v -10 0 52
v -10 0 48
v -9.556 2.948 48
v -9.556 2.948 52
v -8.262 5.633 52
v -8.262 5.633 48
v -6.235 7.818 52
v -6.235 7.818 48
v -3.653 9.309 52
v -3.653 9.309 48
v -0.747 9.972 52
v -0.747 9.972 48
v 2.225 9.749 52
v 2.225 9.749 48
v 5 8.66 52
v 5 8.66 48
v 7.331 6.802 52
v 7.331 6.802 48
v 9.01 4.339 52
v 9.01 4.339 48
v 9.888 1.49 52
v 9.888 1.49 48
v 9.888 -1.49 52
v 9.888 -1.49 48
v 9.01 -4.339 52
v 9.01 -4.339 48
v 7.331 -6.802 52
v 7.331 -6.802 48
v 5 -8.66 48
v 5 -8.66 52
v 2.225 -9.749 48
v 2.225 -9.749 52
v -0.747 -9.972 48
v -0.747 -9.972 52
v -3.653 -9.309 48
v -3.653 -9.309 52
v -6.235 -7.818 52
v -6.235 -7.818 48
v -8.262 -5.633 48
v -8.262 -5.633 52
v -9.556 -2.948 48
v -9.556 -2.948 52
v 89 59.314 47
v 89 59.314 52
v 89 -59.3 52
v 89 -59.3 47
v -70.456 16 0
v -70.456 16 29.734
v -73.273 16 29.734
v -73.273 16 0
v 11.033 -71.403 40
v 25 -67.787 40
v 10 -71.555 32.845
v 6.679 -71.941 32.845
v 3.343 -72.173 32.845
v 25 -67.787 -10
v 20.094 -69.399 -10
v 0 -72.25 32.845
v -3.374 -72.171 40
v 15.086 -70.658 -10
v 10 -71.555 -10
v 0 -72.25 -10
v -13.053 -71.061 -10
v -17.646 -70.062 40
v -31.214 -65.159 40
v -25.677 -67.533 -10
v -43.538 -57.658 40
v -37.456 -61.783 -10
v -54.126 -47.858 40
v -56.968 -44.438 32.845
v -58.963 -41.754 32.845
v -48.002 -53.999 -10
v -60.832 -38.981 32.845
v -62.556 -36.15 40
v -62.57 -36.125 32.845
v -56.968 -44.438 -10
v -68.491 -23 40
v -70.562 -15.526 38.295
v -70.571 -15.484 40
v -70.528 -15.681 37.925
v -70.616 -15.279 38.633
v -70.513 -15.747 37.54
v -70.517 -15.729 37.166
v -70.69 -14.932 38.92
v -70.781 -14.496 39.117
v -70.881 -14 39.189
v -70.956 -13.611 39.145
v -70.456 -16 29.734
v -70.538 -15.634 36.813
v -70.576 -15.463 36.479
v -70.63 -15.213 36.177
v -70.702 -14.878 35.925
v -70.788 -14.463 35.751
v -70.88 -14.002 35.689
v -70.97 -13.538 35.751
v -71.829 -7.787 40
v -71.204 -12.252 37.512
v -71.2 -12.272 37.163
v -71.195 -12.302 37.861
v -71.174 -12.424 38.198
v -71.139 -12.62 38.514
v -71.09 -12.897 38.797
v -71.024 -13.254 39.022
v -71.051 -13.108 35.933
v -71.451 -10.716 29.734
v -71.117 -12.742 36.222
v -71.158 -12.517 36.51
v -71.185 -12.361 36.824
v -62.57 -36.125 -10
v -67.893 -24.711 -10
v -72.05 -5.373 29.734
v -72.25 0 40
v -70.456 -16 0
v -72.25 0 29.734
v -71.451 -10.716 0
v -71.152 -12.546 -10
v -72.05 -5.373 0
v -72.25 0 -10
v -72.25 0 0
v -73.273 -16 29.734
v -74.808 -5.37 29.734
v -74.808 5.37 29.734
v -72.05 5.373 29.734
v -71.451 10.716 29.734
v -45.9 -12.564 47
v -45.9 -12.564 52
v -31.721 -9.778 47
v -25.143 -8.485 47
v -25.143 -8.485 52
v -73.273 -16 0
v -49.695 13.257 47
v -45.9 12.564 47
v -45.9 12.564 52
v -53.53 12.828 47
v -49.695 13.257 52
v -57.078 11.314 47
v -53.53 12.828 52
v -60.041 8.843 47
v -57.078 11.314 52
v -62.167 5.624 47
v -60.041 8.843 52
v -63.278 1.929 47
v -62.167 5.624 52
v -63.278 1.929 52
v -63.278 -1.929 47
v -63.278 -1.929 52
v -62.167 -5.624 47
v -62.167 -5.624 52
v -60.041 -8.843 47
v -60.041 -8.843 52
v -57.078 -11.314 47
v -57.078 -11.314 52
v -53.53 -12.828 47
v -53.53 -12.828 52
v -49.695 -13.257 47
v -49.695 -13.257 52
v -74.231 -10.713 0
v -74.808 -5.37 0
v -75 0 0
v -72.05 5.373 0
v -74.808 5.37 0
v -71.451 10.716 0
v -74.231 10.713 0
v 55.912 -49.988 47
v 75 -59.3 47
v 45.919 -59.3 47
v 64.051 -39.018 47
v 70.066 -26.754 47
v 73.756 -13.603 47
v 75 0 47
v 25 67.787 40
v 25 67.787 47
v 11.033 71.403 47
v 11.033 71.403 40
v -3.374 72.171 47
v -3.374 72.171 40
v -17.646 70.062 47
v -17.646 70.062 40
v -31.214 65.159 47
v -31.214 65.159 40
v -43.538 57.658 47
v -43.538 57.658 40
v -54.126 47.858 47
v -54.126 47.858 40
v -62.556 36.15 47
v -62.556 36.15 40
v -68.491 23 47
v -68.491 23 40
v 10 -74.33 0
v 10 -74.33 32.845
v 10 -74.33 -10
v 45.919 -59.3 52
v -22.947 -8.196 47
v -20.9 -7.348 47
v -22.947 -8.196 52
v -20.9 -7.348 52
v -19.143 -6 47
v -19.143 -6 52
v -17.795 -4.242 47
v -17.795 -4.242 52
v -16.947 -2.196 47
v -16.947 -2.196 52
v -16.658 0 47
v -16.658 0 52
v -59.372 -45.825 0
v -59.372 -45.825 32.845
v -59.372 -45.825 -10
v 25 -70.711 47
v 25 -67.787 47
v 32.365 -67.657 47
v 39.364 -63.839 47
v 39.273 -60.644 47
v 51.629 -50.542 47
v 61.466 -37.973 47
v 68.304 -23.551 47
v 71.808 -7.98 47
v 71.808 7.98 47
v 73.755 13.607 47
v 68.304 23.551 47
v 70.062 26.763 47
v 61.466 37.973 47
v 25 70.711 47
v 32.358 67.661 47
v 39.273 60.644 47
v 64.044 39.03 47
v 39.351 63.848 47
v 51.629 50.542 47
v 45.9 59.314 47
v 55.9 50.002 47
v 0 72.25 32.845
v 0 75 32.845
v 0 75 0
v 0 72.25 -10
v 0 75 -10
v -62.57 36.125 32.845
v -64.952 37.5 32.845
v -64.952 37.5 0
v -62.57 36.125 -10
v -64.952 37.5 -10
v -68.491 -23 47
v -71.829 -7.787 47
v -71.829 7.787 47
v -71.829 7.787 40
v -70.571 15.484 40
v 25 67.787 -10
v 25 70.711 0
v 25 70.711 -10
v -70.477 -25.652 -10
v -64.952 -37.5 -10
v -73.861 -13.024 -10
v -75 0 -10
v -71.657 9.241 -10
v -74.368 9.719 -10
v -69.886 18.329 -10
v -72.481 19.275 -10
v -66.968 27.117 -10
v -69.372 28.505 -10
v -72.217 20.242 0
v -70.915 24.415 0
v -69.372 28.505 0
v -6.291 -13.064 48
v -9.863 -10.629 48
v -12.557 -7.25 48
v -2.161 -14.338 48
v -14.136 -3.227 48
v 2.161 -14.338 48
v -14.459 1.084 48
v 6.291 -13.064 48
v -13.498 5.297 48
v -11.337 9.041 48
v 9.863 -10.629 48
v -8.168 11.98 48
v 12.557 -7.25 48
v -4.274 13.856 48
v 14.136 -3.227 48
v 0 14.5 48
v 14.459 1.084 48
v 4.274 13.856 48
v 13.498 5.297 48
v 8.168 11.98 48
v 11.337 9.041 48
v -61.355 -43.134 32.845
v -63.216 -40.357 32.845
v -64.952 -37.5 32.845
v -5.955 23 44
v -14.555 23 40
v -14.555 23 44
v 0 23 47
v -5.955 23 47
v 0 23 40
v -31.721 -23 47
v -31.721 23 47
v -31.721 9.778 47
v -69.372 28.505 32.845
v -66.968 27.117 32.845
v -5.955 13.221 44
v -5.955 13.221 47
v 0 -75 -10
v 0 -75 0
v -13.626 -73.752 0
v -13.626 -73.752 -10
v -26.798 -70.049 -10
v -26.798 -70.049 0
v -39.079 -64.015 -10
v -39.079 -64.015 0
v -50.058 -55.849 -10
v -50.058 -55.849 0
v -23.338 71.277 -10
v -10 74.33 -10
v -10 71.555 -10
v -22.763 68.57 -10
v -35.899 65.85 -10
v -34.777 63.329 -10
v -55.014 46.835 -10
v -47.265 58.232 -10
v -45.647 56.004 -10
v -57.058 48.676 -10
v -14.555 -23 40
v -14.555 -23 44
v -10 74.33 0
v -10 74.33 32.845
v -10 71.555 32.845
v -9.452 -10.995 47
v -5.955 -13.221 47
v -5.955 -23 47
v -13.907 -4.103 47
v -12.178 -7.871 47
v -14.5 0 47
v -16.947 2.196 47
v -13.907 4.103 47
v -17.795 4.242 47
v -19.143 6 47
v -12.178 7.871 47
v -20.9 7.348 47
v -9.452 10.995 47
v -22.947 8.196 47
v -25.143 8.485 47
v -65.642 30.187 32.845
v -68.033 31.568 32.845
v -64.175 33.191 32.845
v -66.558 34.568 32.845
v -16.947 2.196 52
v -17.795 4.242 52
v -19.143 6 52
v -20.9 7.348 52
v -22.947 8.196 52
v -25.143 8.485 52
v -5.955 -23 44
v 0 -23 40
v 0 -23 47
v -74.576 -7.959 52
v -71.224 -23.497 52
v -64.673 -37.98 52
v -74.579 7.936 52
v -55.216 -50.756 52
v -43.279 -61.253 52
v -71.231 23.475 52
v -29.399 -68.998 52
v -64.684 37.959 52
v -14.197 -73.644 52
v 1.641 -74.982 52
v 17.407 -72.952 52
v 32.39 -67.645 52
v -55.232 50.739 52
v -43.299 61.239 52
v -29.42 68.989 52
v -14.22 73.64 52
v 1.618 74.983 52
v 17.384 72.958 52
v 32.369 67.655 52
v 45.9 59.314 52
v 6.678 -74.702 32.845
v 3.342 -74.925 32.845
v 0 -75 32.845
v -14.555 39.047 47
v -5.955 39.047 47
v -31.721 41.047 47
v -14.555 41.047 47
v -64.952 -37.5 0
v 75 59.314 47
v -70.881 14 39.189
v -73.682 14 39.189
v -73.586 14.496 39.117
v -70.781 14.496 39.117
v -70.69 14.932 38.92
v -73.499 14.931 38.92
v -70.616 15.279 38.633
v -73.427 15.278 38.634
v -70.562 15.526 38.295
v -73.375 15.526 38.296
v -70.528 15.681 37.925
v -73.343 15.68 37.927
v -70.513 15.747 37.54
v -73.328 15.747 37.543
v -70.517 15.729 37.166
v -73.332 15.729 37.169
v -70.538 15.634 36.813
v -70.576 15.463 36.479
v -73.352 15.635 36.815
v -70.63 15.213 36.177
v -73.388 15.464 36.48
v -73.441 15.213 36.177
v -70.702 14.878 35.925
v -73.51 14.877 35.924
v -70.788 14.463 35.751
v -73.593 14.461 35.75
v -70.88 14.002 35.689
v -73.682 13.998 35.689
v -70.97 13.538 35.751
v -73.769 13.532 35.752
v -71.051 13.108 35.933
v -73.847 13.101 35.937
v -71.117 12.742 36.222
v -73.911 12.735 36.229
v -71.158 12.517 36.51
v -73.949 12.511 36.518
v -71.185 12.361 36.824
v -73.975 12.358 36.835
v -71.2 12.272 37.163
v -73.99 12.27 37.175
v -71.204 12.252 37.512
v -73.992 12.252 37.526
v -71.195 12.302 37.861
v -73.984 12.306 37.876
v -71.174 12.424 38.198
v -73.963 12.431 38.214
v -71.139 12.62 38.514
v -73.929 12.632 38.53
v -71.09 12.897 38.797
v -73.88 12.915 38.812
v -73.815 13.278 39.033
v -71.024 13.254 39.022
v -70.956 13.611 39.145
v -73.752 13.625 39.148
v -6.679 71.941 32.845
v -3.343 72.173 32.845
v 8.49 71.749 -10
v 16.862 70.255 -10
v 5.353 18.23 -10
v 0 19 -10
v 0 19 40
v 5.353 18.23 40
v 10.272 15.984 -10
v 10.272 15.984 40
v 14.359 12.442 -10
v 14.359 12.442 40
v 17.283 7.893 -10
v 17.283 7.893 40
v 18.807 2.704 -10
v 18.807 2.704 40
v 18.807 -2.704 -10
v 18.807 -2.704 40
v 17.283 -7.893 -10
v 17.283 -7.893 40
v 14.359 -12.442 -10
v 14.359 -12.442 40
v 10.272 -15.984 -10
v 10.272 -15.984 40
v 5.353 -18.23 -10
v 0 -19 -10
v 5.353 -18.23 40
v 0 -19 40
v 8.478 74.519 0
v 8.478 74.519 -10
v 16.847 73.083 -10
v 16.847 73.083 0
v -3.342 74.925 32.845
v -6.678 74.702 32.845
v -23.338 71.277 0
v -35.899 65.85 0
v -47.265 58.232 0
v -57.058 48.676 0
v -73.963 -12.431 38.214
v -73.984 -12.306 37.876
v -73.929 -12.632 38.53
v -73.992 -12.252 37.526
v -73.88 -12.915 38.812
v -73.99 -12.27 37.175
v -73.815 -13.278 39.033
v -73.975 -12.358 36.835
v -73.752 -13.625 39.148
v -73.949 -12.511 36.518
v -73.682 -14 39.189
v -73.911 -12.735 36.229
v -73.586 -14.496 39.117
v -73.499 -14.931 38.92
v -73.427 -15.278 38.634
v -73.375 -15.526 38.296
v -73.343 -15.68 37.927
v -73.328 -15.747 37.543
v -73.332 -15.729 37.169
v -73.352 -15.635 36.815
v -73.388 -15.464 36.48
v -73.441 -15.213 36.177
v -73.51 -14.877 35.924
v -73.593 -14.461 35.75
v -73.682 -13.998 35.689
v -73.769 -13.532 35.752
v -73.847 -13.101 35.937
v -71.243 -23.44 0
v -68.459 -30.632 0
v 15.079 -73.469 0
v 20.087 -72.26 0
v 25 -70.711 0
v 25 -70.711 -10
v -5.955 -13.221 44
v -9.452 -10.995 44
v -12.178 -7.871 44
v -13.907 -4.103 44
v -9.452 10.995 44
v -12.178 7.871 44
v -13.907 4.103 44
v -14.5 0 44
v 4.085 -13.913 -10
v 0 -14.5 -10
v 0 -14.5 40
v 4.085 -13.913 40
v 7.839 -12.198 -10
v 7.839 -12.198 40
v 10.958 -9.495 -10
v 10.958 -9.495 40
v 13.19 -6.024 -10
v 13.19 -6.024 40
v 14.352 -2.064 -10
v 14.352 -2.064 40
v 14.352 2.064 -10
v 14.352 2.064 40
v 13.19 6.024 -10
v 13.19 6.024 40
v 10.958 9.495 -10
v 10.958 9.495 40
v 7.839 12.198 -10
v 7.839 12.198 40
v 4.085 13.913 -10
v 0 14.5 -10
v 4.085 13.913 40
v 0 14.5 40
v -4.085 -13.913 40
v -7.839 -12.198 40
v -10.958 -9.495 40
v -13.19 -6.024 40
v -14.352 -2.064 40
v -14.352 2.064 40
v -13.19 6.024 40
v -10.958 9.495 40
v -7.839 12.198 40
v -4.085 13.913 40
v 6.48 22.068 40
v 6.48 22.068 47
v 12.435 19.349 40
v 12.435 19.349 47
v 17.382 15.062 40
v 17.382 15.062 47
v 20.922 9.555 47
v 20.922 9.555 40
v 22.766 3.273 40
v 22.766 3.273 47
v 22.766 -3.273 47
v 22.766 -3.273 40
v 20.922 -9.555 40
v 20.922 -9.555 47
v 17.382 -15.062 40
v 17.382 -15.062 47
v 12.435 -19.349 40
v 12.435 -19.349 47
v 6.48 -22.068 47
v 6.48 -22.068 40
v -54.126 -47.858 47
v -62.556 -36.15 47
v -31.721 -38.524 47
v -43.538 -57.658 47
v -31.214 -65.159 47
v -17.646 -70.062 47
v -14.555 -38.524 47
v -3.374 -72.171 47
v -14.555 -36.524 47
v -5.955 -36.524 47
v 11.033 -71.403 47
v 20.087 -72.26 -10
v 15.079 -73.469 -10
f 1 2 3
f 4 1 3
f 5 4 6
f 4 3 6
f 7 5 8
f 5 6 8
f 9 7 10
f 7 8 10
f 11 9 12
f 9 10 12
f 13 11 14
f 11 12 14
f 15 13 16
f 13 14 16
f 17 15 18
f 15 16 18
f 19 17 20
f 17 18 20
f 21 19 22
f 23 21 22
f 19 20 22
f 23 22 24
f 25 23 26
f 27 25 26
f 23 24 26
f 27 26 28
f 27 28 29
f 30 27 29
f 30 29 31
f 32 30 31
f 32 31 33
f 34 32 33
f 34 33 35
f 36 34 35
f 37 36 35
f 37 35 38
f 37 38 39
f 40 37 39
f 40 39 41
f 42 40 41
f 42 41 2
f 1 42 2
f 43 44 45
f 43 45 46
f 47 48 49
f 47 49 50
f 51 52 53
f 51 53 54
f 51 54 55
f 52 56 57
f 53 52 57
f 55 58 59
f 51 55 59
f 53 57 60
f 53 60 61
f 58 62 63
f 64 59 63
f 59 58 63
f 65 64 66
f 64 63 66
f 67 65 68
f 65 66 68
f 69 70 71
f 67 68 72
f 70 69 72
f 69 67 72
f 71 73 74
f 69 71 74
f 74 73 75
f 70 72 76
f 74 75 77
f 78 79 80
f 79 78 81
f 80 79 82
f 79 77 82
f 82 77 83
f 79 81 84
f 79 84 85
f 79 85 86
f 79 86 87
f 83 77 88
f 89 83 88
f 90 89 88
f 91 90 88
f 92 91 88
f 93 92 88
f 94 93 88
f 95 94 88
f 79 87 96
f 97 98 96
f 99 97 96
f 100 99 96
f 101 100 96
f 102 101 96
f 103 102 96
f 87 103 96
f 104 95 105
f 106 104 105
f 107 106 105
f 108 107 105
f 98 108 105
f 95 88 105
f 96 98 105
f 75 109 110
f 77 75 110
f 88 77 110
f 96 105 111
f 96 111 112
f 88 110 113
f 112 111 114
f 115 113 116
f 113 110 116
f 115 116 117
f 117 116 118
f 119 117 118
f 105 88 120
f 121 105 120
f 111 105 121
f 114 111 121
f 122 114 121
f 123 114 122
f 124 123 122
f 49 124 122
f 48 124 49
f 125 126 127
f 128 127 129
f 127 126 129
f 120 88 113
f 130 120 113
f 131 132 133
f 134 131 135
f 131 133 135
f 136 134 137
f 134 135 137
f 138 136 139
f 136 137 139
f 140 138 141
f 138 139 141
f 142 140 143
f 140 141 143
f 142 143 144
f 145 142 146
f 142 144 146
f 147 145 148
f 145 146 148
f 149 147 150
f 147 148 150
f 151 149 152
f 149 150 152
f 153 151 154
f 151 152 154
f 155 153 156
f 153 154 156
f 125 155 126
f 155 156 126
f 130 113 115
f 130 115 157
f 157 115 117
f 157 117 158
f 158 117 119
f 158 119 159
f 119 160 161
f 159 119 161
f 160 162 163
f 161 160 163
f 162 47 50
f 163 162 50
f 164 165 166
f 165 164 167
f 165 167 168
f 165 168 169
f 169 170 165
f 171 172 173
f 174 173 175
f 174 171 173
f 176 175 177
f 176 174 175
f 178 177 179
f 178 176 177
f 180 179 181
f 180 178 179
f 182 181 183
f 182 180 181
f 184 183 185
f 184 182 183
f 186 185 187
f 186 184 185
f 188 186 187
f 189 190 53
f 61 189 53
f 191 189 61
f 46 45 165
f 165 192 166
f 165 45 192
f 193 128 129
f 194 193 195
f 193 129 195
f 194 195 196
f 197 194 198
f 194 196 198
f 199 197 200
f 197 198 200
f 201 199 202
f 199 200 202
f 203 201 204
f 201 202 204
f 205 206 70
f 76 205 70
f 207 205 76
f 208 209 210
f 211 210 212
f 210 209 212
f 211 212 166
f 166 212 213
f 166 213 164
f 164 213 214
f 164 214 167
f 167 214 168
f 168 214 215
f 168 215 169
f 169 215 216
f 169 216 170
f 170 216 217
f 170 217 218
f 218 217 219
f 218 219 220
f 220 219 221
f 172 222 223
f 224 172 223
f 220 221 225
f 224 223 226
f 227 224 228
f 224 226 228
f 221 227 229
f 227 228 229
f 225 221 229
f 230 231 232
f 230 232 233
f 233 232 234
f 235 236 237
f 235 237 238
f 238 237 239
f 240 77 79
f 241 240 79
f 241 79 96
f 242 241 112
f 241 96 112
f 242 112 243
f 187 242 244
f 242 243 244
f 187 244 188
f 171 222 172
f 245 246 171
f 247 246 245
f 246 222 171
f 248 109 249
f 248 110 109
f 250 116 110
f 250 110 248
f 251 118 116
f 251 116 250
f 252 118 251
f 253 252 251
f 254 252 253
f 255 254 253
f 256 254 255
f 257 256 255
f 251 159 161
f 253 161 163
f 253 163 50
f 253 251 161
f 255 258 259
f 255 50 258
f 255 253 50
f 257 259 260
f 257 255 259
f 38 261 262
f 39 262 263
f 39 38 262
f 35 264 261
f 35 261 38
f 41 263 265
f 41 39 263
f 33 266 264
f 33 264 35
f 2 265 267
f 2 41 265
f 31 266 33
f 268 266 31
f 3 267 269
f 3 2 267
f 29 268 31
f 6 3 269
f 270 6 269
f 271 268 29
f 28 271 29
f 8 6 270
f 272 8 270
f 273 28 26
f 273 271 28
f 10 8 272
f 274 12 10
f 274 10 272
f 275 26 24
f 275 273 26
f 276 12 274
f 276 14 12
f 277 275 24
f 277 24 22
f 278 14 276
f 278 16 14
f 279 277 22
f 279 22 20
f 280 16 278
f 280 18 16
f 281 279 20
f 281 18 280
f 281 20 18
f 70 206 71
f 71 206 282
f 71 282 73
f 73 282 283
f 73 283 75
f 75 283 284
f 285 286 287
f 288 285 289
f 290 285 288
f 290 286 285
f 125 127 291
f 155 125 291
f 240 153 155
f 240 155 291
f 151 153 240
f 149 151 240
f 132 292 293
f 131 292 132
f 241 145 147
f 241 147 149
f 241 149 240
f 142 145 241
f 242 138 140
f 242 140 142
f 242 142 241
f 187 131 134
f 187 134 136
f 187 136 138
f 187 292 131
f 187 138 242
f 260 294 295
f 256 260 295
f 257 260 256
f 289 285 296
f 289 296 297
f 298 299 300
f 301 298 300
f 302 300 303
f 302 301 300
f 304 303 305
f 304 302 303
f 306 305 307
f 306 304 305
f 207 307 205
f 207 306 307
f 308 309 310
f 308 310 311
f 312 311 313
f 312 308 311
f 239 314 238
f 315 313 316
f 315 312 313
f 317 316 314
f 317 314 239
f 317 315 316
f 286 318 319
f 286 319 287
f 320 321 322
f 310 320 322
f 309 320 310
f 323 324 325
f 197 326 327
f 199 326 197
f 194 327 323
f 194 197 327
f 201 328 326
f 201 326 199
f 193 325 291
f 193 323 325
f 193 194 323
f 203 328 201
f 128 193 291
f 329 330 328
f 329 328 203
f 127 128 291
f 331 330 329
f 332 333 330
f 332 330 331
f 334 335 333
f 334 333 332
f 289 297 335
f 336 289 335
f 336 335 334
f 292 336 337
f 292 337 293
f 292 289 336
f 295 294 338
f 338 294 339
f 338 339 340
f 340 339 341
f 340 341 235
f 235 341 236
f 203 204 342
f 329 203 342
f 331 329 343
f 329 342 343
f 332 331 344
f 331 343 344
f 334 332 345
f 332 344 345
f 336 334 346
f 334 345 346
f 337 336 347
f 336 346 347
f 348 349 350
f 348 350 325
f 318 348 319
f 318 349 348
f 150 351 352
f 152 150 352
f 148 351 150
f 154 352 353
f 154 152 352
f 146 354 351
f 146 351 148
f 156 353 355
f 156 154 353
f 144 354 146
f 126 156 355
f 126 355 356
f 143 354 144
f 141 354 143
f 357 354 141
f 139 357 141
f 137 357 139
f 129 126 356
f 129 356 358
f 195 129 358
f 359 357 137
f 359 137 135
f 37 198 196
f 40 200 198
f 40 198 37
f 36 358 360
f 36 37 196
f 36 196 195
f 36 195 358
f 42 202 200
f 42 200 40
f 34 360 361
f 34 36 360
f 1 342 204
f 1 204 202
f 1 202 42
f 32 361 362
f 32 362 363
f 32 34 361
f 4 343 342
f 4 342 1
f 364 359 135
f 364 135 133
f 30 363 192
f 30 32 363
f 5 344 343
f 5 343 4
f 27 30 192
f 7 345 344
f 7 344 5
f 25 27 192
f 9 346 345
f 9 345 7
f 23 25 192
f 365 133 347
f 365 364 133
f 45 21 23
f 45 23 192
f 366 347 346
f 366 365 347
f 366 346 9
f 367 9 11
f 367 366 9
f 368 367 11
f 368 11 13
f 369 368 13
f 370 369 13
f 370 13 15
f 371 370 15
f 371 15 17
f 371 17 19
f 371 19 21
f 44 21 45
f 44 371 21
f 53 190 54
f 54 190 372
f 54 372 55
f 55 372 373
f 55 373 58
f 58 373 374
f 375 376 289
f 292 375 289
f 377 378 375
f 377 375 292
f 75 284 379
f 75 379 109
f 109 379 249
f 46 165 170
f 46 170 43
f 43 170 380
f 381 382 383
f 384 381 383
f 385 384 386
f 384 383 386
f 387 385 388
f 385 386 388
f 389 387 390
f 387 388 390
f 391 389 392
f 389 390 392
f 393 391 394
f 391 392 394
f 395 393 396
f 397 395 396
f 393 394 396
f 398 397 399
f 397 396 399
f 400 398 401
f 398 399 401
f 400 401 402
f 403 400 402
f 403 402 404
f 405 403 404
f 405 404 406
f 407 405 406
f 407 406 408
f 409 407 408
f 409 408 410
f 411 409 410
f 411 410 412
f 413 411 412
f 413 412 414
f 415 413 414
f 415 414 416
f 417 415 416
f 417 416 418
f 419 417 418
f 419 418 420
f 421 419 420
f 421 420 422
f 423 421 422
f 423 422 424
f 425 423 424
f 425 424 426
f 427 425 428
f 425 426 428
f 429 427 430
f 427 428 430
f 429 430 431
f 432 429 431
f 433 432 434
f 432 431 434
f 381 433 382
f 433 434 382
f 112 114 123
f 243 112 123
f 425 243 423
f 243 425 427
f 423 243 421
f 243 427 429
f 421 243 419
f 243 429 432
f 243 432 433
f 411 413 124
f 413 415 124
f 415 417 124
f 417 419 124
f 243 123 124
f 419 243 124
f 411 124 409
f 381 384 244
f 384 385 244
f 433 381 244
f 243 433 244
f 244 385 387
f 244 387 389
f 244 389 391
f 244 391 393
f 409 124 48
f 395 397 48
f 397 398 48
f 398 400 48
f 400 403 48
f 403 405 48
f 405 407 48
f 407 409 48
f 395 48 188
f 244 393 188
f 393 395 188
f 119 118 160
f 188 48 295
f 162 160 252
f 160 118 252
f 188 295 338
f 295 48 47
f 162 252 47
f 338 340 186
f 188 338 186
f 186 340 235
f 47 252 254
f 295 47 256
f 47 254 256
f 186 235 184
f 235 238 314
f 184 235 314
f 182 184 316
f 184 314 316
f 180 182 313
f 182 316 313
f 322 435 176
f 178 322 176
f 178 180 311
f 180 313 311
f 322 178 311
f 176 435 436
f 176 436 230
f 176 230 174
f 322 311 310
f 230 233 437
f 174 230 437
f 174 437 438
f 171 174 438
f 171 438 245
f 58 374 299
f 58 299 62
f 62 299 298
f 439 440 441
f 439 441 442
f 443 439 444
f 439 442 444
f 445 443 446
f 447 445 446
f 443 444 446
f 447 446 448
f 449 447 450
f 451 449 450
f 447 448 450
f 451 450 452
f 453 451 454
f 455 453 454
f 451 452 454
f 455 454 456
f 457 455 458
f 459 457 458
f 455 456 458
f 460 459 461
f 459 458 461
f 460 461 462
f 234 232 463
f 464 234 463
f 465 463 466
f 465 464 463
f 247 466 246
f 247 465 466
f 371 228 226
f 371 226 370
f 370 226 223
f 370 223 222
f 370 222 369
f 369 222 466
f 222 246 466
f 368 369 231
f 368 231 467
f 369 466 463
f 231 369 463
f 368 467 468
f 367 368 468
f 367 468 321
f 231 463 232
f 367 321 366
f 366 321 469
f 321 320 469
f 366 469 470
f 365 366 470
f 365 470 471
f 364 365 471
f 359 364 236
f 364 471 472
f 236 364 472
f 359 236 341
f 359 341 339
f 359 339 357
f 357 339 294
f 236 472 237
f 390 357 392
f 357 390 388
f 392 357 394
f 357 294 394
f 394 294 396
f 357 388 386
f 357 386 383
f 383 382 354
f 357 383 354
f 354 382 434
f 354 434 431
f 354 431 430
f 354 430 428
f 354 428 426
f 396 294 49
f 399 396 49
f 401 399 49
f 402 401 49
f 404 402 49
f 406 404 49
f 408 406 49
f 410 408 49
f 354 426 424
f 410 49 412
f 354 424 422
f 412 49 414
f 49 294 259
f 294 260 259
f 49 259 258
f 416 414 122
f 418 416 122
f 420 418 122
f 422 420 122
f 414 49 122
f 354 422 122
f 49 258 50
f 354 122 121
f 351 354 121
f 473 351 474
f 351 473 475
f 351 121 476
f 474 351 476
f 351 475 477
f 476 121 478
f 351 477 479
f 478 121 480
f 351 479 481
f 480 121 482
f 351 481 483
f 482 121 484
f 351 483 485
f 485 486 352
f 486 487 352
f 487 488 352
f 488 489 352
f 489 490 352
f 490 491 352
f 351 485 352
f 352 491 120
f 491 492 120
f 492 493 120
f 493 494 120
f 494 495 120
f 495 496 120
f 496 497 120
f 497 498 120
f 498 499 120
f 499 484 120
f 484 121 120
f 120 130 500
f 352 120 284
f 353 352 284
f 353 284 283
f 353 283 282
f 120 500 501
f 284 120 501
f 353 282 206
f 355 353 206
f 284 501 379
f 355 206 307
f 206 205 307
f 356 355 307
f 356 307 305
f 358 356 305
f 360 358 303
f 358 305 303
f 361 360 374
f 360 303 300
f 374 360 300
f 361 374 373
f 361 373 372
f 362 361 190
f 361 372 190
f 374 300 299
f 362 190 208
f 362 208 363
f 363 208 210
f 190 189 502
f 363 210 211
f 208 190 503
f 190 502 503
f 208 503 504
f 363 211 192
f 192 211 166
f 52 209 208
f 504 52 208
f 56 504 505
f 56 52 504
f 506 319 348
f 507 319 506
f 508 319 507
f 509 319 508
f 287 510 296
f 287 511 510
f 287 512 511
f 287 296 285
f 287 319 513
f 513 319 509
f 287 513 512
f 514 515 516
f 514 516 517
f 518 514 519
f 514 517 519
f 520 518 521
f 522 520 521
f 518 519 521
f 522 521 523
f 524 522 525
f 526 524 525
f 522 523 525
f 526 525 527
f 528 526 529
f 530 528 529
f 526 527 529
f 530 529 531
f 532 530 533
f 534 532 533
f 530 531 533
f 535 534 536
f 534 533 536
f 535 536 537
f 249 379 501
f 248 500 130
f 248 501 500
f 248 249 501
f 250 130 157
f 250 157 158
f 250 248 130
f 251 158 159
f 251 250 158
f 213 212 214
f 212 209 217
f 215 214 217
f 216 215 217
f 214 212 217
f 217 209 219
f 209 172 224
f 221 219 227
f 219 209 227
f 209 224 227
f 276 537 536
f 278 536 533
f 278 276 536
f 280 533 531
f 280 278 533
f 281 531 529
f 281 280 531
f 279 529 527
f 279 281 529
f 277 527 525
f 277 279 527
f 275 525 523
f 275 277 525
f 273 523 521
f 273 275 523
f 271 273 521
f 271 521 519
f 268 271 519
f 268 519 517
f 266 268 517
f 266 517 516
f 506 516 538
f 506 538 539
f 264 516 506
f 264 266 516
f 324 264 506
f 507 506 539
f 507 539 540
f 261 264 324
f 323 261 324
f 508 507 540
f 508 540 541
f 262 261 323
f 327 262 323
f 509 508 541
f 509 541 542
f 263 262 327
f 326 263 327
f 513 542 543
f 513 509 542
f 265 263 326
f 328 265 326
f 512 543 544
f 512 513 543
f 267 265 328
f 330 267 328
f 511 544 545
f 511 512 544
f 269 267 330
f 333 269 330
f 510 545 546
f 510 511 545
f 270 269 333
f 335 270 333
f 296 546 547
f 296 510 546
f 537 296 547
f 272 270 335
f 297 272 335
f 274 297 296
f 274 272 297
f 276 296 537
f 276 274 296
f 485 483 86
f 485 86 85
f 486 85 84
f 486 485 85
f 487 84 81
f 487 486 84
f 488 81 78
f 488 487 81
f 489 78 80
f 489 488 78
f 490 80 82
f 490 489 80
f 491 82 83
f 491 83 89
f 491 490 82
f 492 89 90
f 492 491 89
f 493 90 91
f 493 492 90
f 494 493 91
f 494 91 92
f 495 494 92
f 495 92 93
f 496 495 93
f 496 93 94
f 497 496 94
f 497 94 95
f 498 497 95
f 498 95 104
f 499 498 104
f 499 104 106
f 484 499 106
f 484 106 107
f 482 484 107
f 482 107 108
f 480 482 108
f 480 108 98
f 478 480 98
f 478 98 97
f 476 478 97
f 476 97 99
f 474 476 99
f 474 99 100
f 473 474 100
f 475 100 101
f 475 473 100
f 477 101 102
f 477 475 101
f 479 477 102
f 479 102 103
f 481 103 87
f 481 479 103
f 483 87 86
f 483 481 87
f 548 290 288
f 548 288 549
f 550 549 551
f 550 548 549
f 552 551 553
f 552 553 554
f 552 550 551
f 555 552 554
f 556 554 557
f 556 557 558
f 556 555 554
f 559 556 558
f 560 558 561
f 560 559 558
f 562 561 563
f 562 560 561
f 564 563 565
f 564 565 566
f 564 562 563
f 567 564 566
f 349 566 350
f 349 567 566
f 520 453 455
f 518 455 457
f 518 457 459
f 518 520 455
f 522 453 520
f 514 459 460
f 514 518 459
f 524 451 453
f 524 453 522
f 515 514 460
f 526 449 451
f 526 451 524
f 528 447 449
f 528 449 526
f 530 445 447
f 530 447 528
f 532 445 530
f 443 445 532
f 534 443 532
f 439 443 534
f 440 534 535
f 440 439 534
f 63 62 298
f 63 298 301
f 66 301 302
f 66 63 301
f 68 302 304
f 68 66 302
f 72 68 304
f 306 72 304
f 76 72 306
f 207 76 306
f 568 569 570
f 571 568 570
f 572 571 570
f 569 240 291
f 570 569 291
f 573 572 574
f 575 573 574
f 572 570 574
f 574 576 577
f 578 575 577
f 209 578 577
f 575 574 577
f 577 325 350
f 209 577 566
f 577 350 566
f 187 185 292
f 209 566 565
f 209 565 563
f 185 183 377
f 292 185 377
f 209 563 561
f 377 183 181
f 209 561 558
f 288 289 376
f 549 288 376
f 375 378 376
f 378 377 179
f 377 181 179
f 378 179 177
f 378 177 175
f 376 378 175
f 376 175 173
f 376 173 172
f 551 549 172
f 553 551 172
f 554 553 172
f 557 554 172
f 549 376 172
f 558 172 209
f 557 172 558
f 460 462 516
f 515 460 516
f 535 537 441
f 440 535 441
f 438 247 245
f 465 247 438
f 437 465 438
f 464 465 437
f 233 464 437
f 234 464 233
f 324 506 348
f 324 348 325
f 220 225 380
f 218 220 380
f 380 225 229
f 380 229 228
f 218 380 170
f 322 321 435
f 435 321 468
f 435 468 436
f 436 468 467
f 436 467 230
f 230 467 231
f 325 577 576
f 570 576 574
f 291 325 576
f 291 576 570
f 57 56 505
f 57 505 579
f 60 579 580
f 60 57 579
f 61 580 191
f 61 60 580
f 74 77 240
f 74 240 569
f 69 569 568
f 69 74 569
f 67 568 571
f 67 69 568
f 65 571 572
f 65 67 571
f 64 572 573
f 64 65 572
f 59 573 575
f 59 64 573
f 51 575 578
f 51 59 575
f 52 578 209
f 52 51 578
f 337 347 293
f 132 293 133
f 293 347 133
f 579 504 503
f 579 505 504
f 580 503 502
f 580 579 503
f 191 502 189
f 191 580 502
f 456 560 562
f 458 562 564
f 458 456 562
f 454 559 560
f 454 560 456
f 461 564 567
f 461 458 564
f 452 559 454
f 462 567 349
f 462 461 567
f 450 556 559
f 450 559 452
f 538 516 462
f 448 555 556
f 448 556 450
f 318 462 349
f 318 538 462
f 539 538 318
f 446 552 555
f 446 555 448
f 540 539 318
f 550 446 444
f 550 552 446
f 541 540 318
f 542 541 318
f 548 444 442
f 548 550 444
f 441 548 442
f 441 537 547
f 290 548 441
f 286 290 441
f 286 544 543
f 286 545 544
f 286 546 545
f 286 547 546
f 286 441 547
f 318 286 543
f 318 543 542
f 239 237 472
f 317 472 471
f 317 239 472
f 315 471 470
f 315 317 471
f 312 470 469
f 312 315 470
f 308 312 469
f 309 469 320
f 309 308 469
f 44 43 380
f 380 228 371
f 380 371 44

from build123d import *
from build123d.topology import SkipClean

# Parameters (mm, degrees)
SKETCH1_R                = 75
BOSS_EXTRUDE1_DEPTH      = 52
BOSS_EXTRUDE2_DEPTH      = 89
SKETCH6_R                = 67.5
CUT_EXTRUDE1_DEPTH       = 40
SKETCH7_R                = 10
CUT_EXTRUDE2_DEPTH       = 140
BOSS_EXTRUDE3_DEPTH      = 50
SKETCH27_R               = 13.264650289
SKETCH27_R_2             = 8.484923144
CUT_EXTRUDE7_DEPTH       = 32
SKETCH28_W               = 110.347797284
SKETCH28_H               = 32
CUT_EXTRUDE9_DEPTH       = 112
SKETCH30_R               = 1.75
CUT_EXTRUDE10_DEPTH      = 10
SKETCH31_W               = 17.16689537
SKETCH31_H               = 79.570672492
CUT_EXTRUDE11_DEPTH      = 7
SKETCH32_W               = 3
SKETCH32_H               = 75.570672492
CUT_EXTRUDE12_DEPTH      = 8.6
CUT_EXTRUDE13_START      = -8
SKETCH34_R               = 14.5
CUT_EXTRUDE13_DEPTH      = 8
BOSS_EXTRUDE4_START      = 10
SKETCH35_R               = 75
SKETCH35_R_2             = 67.5
BOSS_EXTRUDE4_DEPTH      = 10
SKETCH37_R               = 72.25
SKETCH37_R_2             = 67.5
CUT_EXTRUDE15_DEPTH      = 50
CUT_EXTRUDE16_DEPTH      = 7
CUT_EXTRUDE17_DEPTH      = 7
CUT_EXTRUDE19_REACH      = 184.003
CUT_EXTRUDE19_END_RADIUS = 72.25
SKETCH42_W               = 10
SKETCH42_H               = 42.845008339
CIRPATTERN1_COUNT        = 5
CIRPATTERN1_ANGLE        = 180
CIRPATTERN2_COUNT        = 3
CIRPATTERN2_ANGLE        = 120
CUT_EXTRUDE20_DEPTH      = 10
SKETCH44_W               = 50
SKETCH44_H               = 57
CUT_EXTRUDE21_DEPTH      = 183.002747343


with BuildPart() as part:
    # Sketch1 → Boss-Extrude1 (new body)
    with BuildSketch(Plane.XY):
        Circle(SKETCH1_R)
    extrude(amount=BOSS_EXTRUDE1_DEPTH)

    # Sketch5 → Boss-Extrude2 (add)
    with BuildSketch(Plane(origin=(0, 0, 0), x_dir=(0, 0, -1), z_dir=(1, 0, 0))):
        Polygon((-52, 59.314332163), (-52, 0), (-52, -59.3), (-47, -59.3), (-47, 59.314332163), align=None)
    extrude(amount=BOSS_EXTRUDE2_DEPTH)

    # Sketch6 → Cut-Extrude1 (cut)
    with BuildSketch(Plane(origin=(0, 0, 0), x_dir=(-1, 0, 0), z_dir=(0, 0, -1))):
        Circle(SKETCH6_R)
    extrude(amount=-CUT_EXTRUDE1_DEPTH, mode=Mode.SUBTRACT)

    # Sketch7 → Cut-Extrude2 (cut)
    with BuildSketch(Plane(origin=(0, 0, 40), x_dir=(-1, 0, 0), z_dir=(0, 0, -1))):
        Circle(SKETCH7_R)
    extrude(amount=-CUT_EXTRUDE2_DEPTH, mode=Mode.SUBTRACT)

    # Sketch8 → Boss-Extrude3 (add)
    with BuildSketch(Plane(origin=(0, 0, 40), x_dir=(-1, 0, 0), z_dir=(0, 0, -1))):
        with BuildLine():
            Line((0, 14.5), (0, 19))
            ThreePointArc((0, 19), (-19, 0), (0, -19))
            Line((0, -19), (0, -14.5))
            ThreePointArc((0, -14.5), (-14.5, 0), (0, 14.5))
        make_face()
    extrude(amount=BOSS_EXTRUDE3_DEPTH)

    # Sketch27 → Cut-Extrude7 (cut)
    with BuildSketch(Plane.XY.offset(52)):
        with Locations((-50.154049213, 0)):
            Circle(SKETCH27_R)
        with Locations((-25.142941415, 0)):
            Circle(SKETCH27_R_2)
    extrude(amount=-CUT_EXTRUDE7_DEPTH, mode=Mode.SUBTRACT)

    # Sketch28 → Cut-Extrude9 (cut)
    with BuildSketch(Plane(origin=(0, 0, 0), x_dir=(0, 0, -1), z_dir=(1, 0, 0))):
        with Locations((25.439488733, 0)):
            Rectangle(SKETCH28_W, SKETCH28_H)
    extrude(amount=-CUT_EXTRUDE9_DEPTH, mode=Mode.SUBTRACT)

    # Sketch30 → Cut-Extrude10 (cut)
    with BuildSketch(Plane(origin=(-75, 0, 0), x_dir=(0, 0, -1), z_dir=(1, 0, 0))):
        with Locations(Location((-37.43856487, -14, 0), (0, 0, 180))):
            Circle(SKETCH30_R)
    cut_extrude10 = extrude(amount=CUT_EXTRUDE10_DEPTH, mode=Mode.SUBTRACT)

    # Mirror1: Cut-Extrude10 across plane
    add(cut_extrude10.mirror(Plane.ZX), mode=Mode.SUBTRACT)

    # Sketch31 → Cut-Extrude11 (cut)
    with BuildSketch(Plane(origin=(0, 0, 40), x_dir=(-1, 0, 0), z_dir=(0, 0, -1))):
        with Locations((23.137999933, 1.261486271)):
            Rectangle(SKETCH31_W, SKETCH31_H)
    extrude(amount=-CUT_EXTRUDE11_DEPTH, mode=Mode.SUBTRACT)

    # Sketch32 → Cut-Extrude12 (cut)
    with BuildSketch(Plane.ZY.offset(14.554552248)):
        with Locations((45.5, 1.261486271)):
            Rectangle(SKETCH32_W, SKETCH32_H)
    extrude(amount=-CUT_EXTRUDE12_DEPTH, mode=Mode.SUBTRACT)

    # Sketch34 → Cut-Extrude13 (cut)
    with SkipClean():  # the faces are left unmerged after this step: merging them gives an invalid solid
        with BuildSketch(Plane(origin=(0, 0, 40), x_dir=(-1, 0, 0), z_dir=(0, 0, -1)).offset(CUT_EXTRUDE13_START)):
            with Locations(Location((0, 0, 0), (0, 0, 90))):
                Circle(SKETCH34_R)
        extrude(amount=CUT_EXTRUDE13_DEPTH, mode=Mode.SUBTRACT)

    # Sketch35 → Boss-Extrude4 (add)
    with BuildSketch(Plane(origin=(0, 0, 0), x_dir=(-1, 0, 0), z_dir=(0, 0, -1)).offset(BOSS_EXTRUDE4_START)):
        Circle(SKETCH35_R)
        Circle(SKETCH35_R_2, mode=Mode.SUBTRACT)
    extrude(amount=-BOSS_EXTRUDE4_DEPTH)

    # Sketch37 → Cut-Extrude15 (cut)
    with BuildSketch(Plane(origin=(0, 0, -10), x_dir=(-1, 0, 0), z_dir=(0, 0, -1))):
        Circle(SKETCH37_R)
        Circle(SKETCH37_R_2, mode=Mode.SUBTRACT)
    extrude(amount=-CUT_EXTRUDE15_DEPTH, mode=Mode.SUBTRACT)

    # Sketch38 → Cut-Extrude16 (cut)
    with BuildSketch(Plane(origin=(0, 0, 40), x_dir=(-1, 0, 0), z_dir=(0, 0, -1))):
        with BuildLine():
            Line((0, -23), (68.491331568, -23))
            ThreePointArc((68.491331568, -23), (-72.25, 0), (68.491331568, 23))
            Line((68.491331568, 23), (0, 23))
            ThreePointArc((0, 23), (-23, 0), (0, -23))
        make_face()
    extrude(amount=-CUT_EXTRUDE16_DEPTH, mode=Mode.SUBTRACT)

    # Sketch39 → Cut-Extrude17 (cut)
    with BuildSketch(Plane(origin=(0, 0, 40), x_dir=(-1, 0, 0), z_dir=(0, 0, -1))):
        with BuildLine():
            Line((68.491331568, 23), (31.721447618, 23))
            Line((31.721447618, 23), (31.721447618, -23))
            Line((31.721447618, -23), (68.491331568, -23))
            ThreePointArc((68.491331568, -23), (72.25, 0), (68.491331568, 23))
        make_face()
    extrude(amount=-CUT_EXTRUDE17_DEPTH, mode=Mode.SUBTRACT)

    # Cut-Extrude19: up to this cylinder (the profile starts outside it)
    cut_extrude19_end = Plane(origin=(0, 0, 11.422504), z_dir=(0, 0, -1)) * Cylinder(CUT_EXTRUDE19_END_RADIUS, 513.506, mode=Mode.PRIVATE)
    # Sketch42 → Cut-Extrude19 (cut, up to the surface)
    with BuildSketch(Plane(origin=(0, 75, 0), x_dir=(1, 0, 0), z_dir=(0, 1, 0)), mode=Mode.PRIVATE) as cut_extrude19_sk1:
        with Locations((-5, -11.42250417)):
            Rectangle(SKETCH42_W, SKETCH42_H)
    cut_extrude19_tool1 = extrude(cut_extrude19_sk1.sketch, amount=-CUT_EXTRUDE19_REACH, mode=Mode.PRIVATE) - cut_extrude19_end
    cut_extrude19 = cut_extrude19_tool1.solids().sort_by_distance((-5, 75, 11.422504))[0]
    add(cut_extrude19, mode=Mode.SUBTRACT)

    # CirPattern1: Cut-Extrude19 ×5 about axis
    cirpattern1_axis = Axis((0, 0, 0), (0, 0, -1))
    for i in range(1, CIRPATTERN1_COUNT):
        add(cut_extrude19.rotate(cirpattern1_axis, i * CIRPATTERN1_ANGLE / (CIRPATTERN1_COUNT - 1)), mode=Mode.SUBTRACT)

    # CirPattern2: Cut-Extrude19 ×3 about axis
    cirpattern2_axis = Axis((0, 0, 0), (0, 0, 1))
    for i in range(1, CIRPATTERN2_COUNT):
        add(cut_extrude19.rotate(cirpattern2_axis, i * CIRPATTERN2_ANGLE / (CIRPATTERN2_COUNT - 1)), mode=Mode.SUBTRACT)

    # Sketch43 → Cut-Extrude20 (cut)
    with BuildSketch(Plane.XY.offset(52)):
        Polygon((-45.9, -12.56399668), (-25.142941415, -8.484923144), (-25.142941415, 8.484923144), (-45.9, 12.56399668), align=None)
    extrude(amount=-CUT_EXTRUDE20_DEPTH, mode=Mode.SUBTRACT)

    # Sketch44 → Cut-Extrude21 (cut, through all)
    with SkipClean():  # the faces are left unmerged after this step: merging them gives an invalid solid
        with BuildSketch(Plane(origin=(0, 75, 0), x_dir=(1, 0, 0), z_dir=(0, 1, 0))):
            with Locations((50, -18.5)):
                Rectangle(SKETCH44_W, SKETCH44_H)
        extrude(amount=-CUT_EXTRUDE21_DEPTH, mode=Mode.SUBTRACT)
    add(part.part.scale(1), mode=Mode.REPLACE)  # the faces are merged on a copy


solid = part.part
